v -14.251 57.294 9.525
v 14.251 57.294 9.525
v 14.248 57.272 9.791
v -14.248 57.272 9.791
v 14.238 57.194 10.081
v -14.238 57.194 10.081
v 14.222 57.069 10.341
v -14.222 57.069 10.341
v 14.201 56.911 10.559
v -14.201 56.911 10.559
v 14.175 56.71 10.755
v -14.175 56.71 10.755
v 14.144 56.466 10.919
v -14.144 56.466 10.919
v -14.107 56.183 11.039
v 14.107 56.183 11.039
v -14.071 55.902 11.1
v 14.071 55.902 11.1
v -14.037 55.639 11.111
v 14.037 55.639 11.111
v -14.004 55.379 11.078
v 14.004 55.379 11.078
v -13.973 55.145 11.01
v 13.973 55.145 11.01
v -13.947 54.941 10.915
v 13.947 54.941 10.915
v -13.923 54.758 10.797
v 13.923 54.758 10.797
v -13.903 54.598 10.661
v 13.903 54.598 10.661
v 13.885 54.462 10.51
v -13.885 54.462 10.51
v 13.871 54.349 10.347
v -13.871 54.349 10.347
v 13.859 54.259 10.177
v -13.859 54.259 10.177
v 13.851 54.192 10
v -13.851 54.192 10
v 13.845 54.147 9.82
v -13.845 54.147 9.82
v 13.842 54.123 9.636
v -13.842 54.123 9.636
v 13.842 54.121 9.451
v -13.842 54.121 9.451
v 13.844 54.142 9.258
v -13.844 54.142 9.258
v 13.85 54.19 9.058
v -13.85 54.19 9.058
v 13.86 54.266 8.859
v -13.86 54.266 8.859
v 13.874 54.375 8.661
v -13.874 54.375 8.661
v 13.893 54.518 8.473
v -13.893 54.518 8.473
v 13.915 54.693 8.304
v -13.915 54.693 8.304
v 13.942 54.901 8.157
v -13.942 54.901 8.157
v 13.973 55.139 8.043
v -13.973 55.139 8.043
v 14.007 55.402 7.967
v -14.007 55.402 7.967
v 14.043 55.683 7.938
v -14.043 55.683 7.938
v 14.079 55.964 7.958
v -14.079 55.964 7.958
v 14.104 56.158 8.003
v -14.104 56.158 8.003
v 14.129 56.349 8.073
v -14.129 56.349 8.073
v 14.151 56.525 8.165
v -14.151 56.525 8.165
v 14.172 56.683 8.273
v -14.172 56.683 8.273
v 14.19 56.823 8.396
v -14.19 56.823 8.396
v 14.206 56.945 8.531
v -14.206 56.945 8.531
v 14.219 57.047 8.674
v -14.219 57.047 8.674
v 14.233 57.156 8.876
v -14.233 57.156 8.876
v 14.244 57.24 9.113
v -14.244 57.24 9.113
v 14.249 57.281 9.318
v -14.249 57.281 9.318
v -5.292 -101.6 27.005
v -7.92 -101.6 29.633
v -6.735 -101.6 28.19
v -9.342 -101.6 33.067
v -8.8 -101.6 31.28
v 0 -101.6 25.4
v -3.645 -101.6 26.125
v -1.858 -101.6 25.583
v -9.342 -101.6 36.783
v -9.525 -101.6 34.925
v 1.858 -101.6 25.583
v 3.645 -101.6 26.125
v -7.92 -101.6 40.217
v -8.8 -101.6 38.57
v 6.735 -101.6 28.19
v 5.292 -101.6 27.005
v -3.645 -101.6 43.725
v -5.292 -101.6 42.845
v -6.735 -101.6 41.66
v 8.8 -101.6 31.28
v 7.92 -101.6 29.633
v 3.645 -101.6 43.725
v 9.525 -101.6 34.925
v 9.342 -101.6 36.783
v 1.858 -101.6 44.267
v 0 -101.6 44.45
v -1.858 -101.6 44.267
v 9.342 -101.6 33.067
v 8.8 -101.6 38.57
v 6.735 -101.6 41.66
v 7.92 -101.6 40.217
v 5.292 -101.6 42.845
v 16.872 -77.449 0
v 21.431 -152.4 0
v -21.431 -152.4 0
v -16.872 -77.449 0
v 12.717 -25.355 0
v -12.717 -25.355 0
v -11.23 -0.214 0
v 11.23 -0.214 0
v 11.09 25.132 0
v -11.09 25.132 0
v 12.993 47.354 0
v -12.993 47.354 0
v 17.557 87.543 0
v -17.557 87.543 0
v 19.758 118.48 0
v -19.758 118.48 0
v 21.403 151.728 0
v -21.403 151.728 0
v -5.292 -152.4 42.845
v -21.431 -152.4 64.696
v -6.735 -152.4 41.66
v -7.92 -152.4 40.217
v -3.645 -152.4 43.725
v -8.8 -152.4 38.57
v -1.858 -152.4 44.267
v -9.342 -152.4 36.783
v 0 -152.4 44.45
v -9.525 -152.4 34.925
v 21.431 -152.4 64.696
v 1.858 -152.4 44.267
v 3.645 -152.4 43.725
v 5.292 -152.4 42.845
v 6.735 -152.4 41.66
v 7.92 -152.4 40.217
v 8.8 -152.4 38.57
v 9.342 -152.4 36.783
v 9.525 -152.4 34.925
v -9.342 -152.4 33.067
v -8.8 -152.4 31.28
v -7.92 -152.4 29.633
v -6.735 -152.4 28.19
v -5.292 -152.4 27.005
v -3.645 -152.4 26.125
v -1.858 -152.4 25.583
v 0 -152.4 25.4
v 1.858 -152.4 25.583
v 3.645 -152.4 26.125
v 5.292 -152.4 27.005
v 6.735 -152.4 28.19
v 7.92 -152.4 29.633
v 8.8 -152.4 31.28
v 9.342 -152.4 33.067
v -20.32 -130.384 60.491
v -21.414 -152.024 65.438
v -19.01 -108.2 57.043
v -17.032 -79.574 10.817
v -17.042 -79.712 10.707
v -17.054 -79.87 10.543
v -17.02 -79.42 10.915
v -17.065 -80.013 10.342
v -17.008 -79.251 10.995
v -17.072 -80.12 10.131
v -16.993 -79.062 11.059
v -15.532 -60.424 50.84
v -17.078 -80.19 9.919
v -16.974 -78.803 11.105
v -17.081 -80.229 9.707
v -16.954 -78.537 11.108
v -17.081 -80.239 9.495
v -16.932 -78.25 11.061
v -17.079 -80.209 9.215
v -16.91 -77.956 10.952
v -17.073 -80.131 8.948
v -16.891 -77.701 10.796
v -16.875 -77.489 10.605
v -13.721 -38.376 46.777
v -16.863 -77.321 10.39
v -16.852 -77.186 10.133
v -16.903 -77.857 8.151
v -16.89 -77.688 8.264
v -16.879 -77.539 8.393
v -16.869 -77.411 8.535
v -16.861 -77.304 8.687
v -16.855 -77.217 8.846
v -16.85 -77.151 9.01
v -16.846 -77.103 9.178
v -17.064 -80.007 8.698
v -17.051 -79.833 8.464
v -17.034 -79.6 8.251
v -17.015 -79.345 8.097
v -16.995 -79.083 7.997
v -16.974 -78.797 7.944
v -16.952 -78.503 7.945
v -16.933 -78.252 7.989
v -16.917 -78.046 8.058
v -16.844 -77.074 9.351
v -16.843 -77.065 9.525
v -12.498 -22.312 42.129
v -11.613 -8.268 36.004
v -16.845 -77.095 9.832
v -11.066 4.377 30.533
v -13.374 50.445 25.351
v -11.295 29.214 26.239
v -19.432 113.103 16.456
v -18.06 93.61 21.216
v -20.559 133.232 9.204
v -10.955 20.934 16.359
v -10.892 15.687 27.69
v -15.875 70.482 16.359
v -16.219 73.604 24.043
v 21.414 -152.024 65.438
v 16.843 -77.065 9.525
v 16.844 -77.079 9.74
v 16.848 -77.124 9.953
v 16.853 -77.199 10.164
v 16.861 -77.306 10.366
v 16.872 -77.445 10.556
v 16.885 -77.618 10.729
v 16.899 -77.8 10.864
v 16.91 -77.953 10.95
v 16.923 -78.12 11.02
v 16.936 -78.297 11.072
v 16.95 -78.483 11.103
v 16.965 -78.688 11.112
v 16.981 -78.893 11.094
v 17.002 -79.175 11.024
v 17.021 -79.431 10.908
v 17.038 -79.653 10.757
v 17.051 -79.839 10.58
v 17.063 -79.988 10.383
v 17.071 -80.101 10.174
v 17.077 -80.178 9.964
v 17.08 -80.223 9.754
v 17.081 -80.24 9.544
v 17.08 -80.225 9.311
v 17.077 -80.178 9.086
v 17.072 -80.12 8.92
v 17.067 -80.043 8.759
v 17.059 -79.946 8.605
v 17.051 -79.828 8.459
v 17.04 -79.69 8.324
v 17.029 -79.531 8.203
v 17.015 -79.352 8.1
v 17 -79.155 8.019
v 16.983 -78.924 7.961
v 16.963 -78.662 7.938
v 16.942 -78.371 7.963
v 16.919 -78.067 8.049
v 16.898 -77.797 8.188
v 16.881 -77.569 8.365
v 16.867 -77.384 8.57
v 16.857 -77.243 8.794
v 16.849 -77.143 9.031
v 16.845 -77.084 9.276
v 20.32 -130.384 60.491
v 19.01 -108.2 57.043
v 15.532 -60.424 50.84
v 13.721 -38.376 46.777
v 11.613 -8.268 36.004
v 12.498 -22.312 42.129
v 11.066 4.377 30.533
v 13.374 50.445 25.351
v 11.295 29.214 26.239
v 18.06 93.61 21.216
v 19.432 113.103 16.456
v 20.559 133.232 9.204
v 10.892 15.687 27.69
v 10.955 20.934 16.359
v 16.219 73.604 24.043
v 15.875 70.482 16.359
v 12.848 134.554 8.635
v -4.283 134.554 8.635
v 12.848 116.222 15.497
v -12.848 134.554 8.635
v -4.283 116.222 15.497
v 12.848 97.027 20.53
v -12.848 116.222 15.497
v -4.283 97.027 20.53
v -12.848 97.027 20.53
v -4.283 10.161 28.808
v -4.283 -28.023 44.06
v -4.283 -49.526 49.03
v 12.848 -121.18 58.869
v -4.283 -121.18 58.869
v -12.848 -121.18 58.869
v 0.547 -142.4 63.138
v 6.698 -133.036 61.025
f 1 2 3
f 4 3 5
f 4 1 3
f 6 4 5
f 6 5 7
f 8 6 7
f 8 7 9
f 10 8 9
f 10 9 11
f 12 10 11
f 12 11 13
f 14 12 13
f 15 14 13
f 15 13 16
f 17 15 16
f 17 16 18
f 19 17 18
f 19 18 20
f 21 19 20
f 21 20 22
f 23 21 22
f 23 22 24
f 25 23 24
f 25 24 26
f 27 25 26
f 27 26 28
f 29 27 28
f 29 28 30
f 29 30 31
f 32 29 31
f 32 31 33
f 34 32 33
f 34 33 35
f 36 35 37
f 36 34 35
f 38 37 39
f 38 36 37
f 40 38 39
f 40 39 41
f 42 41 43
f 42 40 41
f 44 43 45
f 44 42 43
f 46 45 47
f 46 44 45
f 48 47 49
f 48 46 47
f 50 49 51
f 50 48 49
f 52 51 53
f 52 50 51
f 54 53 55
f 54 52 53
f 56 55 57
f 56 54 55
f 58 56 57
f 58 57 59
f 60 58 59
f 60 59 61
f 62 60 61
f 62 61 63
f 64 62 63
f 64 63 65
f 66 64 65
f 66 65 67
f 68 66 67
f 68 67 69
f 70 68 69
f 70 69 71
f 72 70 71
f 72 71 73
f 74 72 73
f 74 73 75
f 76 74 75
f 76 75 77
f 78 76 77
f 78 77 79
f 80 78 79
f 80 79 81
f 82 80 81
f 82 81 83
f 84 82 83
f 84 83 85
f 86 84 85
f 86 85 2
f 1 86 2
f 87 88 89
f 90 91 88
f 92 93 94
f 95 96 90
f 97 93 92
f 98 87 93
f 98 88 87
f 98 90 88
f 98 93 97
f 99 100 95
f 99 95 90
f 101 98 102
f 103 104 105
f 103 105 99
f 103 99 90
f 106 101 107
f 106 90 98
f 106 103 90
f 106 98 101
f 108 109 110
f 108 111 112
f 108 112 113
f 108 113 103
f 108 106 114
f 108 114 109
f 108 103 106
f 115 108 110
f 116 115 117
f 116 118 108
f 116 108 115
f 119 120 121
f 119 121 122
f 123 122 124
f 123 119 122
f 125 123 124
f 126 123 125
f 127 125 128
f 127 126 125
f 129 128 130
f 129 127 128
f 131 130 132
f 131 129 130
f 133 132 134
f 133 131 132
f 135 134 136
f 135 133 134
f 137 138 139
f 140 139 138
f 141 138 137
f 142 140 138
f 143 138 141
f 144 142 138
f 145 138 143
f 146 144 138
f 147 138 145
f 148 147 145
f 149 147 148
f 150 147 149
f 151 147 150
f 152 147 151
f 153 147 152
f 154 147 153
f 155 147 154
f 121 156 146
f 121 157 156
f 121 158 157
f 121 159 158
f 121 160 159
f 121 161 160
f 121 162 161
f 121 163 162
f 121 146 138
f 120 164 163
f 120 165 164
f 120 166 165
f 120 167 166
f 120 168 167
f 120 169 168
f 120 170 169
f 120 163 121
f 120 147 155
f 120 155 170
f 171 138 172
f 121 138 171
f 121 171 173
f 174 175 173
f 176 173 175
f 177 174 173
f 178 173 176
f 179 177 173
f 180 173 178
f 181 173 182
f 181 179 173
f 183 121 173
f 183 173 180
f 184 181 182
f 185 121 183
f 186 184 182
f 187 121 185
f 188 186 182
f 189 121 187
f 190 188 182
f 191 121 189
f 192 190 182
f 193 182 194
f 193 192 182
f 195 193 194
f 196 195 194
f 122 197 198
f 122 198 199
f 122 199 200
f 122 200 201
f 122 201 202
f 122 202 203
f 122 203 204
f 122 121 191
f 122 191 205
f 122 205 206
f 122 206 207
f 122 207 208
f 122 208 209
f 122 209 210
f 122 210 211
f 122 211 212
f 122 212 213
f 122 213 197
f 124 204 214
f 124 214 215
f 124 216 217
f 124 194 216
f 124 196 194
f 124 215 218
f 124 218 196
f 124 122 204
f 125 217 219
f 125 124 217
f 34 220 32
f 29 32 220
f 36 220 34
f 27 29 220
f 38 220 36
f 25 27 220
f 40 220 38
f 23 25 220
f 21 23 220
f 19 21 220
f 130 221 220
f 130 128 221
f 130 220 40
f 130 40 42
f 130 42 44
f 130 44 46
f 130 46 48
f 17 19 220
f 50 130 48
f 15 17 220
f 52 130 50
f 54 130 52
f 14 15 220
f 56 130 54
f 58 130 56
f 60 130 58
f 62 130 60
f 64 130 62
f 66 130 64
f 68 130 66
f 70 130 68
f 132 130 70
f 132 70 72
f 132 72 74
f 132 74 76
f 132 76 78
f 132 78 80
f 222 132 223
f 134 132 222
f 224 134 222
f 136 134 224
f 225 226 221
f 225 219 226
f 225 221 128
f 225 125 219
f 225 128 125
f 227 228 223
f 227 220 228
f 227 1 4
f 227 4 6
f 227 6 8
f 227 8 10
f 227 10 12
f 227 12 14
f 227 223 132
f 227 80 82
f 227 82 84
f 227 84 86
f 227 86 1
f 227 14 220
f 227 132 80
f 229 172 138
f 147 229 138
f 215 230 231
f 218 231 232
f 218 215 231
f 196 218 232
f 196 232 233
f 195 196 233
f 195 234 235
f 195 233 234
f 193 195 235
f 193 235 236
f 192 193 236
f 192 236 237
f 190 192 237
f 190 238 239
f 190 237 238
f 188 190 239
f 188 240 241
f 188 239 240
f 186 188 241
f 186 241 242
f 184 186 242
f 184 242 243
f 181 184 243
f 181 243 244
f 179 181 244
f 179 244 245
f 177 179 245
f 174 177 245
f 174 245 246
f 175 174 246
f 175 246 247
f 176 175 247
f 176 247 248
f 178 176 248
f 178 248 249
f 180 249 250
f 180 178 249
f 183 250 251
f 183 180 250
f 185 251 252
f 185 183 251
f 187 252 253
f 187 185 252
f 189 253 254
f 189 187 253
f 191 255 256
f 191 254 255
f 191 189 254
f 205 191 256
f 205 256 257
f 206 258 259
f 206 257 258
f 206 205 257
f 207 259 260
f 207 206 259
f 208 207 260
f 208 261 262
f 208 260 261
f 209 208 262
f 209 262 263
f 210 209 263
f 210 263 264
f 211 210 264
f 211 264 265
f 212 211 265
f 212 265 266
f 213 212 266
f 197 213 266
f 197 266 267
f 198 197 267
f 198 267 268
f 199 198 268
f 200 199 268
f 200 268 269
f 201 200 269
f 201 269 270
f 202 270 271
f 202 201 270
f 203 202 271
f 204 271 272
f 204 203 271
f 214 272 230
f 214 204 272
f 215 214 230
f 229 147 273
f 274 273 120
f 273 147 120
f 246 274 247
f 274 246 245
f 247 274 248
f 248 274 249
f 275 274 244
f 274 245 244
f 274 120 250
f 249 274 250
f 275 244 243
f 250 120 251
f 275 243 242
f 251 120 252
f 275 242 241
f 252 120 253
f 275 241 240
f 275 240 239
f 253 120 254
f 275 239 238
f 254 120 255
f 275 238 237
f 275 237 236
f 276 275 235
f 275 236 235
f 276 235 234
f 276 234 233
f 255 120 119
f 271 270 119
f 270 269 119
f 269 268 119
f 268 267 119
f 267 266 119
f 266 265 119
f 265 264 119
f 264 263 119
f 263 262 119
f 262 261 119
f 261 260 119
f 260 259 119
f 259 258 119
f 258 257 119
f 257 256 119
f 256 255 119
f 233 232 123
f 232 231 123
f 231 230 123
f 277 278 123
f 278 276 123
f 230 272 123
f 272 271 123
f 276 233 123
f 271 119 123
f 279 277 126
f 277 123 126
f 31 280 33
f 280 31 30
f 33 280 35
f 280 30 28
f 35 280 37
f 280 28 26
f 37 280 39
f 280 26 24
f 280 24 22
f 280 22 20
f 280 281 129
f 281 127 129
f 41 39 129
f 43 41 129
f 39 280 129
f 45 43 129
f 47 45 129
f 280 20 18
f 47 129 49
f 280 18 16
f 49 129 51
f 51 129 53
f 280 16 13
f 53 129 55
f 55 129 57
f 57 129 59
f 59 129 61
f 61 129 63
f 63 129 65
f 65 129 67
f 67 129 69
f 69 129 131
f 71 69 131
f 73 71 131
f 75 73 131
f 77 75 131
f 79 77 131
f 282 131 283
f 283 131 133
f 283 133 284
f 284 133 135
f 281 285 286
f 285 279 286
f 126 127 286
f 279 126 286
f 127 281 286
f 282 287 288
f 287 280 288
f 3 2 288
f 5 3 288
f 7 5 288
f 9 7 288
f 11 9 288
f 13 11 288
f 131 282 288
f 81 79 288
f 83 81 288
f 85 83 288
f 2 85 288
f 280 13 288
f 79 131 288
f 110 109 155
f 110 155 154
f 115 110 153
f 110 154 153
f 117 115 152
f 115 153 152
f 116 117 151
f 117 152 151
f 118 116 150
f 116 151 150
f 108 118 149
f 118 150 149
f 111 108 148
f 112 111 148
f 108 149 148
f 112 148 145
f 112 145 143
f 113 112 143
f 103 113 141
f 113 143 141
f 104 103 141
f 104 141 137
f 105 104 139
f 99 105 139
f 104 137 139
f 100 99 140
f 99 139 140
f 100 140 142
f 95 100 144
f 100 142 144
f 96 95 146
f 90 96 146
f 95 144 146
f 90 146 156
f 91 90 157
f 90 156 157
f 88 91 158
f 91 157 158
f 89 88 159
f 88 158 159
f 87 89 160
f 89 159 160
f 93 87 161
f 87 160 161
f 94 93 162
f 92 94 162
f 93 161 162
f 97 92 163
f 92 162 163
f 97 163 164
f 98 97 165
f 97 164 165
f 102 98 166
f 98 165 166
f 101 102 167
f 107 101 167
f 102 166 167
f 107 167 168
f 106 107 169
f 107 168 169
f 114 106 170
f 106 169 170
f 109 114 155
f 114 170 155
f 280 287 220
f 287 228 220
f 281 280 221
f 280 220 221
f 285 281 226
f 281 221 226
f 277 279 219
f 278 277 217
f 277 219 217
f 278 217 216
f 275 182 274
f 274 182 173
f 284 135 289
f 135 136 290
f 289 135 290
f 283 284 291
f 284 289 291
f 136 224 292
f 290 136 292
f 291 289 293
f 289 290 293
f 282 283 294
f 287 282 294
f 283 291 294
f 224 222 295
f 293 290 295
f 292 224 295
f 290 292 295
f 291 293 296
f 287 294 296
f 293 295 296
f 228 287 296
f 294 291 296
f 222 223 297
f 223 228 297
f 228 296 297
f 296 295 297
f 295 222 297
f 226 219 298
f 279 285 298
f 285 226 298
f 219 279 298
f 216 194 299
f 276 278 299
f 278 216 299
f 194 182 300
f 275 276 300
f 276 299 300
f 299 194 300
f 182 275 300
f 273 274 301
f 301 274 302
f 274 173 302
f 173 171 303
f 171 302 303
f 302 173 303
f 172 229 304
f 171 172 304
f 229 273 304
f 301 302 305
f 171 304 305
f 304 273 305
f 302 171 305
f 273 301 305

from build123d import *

# Parameters (mm, degrees)
F1_DEPTH = 21.43125
F2_R     = 9.525
F3_DEPTH = 50.8
F7_START = -21.43225
F6_R     = 1.5875
F7_DEPTH = 42.8645
F8_DEPTH = 65.4386075672


with BuildPart() as f1:
    # F0 (on Right) → F1 (new body, symmetric)
    with BuildSketch(Plane.YZ):
        Polygon((-152.4, 69.85), (-152.4, 0), (152.4, 0), (152.4, 19.05), align=None)
    extrude(amount=F1_DEPTH, both=True)

    # F2 (on face) → F3 (cut)
    with BuildSketch(Plane.XZ.offset(152.4)):
        with Locations((0, 34.925)):
            Circle(F2_R)
    extrude(amount=-F3_DEPTH, mode=Mode.SUBTRACT)

    # F6 (on Right) → F7 (intersect)
    with BuildSketch(Plane.YZ.offset(F7_START)):
        with BuildLine():
            Line((174.2178350687, -16.3004118949), (151.7277061939, 0))
            add(Edge.make_bspline(
                [(151.7277061939, 0), (129.7345931029, 12.6684667422), (79.8440287512, 28.2813260519), (7.5155798195, 23.2190884958), (-24.3392684921, 49.5404318303), (-121.0460820318, 56.7773848647), (-144.1742181778, 63.693292439), (-152.0236283541, 65.4376074672)],
                knots=[0, 0, 0, 0, 0.2279166648, 0.439445095, 0.604781481, 0.8552043223, 1, 1, 1, 1], degree=3))
            Line((-152.0236283541, 65.4376074672), (-173.6085563898, 22.9317266494))
            Line((-173.6085563898, 22.9317266494), (-173.6085563898, -33.5242785513))
            Line((-173.6085563898, -33.5242785513), (174.2178350687, -16.3004118949))
        make_face()
        with Locations((-78.652203083, 9.525)):
            Circle(F6_R, mode=Mode.SUBTRACT)
        with Locations((55.7069741189, 9.525)):
            Circle(F6_R, mode=Mode.SUBTRACT)
    extrude(amount=F7_DEPTH, mode=Mode.INTERSECT)

    # F5 (on face) → F8 (cut, through all)
    with BuildSketch(Plane(origin=(0, 0, 0), x_dir=(1, 0, 0), z_dir=(0, 0, -1))):
        with BuildLine():
            add(Edge.make_bspline(
                [(-21.43125, 152.4), (-20.1060480027, 123.7571255084), (-16.5522601781, 66.7265424738), (-8.0871548438, -21.2285272096), (-17.0808352286, -70.262324058), (-20.2091141482, -122.7621387002), (-21.43125, -152.4)],
                knots=[0, 0, 0, 0, 0.2698088007, 0.5362275171, 0.7392686135, 1, 1, 1, 1], degree=3))
            Line((-21.43125, 152.4), (-21.43125, -152.4))
        make_face()
        with BuildLine():
            Line((21.43125, -152.4), (21.43125, 152.4))
            add(Edge.make_bspline(
                [(21.43125, 152.4), (20.1060480027, 123.7571255084), (16.5522601781, 66.7265424738), (8.0871548438, -21.2285272096), (17.0808352286, -70.262324058), (20.2091141482, -122.7621387002), (21.43125, -152.4)],
                knots=[0, 0, 0, 0, 0.2698088007, 0.5362275171, 0.7392686135, 1, 1, 1, 1], degree=3))
        make_face()
    extrude(amount=-F8_DEPTH, mode=Mode.SUBTRACT)


solid = f1.part
